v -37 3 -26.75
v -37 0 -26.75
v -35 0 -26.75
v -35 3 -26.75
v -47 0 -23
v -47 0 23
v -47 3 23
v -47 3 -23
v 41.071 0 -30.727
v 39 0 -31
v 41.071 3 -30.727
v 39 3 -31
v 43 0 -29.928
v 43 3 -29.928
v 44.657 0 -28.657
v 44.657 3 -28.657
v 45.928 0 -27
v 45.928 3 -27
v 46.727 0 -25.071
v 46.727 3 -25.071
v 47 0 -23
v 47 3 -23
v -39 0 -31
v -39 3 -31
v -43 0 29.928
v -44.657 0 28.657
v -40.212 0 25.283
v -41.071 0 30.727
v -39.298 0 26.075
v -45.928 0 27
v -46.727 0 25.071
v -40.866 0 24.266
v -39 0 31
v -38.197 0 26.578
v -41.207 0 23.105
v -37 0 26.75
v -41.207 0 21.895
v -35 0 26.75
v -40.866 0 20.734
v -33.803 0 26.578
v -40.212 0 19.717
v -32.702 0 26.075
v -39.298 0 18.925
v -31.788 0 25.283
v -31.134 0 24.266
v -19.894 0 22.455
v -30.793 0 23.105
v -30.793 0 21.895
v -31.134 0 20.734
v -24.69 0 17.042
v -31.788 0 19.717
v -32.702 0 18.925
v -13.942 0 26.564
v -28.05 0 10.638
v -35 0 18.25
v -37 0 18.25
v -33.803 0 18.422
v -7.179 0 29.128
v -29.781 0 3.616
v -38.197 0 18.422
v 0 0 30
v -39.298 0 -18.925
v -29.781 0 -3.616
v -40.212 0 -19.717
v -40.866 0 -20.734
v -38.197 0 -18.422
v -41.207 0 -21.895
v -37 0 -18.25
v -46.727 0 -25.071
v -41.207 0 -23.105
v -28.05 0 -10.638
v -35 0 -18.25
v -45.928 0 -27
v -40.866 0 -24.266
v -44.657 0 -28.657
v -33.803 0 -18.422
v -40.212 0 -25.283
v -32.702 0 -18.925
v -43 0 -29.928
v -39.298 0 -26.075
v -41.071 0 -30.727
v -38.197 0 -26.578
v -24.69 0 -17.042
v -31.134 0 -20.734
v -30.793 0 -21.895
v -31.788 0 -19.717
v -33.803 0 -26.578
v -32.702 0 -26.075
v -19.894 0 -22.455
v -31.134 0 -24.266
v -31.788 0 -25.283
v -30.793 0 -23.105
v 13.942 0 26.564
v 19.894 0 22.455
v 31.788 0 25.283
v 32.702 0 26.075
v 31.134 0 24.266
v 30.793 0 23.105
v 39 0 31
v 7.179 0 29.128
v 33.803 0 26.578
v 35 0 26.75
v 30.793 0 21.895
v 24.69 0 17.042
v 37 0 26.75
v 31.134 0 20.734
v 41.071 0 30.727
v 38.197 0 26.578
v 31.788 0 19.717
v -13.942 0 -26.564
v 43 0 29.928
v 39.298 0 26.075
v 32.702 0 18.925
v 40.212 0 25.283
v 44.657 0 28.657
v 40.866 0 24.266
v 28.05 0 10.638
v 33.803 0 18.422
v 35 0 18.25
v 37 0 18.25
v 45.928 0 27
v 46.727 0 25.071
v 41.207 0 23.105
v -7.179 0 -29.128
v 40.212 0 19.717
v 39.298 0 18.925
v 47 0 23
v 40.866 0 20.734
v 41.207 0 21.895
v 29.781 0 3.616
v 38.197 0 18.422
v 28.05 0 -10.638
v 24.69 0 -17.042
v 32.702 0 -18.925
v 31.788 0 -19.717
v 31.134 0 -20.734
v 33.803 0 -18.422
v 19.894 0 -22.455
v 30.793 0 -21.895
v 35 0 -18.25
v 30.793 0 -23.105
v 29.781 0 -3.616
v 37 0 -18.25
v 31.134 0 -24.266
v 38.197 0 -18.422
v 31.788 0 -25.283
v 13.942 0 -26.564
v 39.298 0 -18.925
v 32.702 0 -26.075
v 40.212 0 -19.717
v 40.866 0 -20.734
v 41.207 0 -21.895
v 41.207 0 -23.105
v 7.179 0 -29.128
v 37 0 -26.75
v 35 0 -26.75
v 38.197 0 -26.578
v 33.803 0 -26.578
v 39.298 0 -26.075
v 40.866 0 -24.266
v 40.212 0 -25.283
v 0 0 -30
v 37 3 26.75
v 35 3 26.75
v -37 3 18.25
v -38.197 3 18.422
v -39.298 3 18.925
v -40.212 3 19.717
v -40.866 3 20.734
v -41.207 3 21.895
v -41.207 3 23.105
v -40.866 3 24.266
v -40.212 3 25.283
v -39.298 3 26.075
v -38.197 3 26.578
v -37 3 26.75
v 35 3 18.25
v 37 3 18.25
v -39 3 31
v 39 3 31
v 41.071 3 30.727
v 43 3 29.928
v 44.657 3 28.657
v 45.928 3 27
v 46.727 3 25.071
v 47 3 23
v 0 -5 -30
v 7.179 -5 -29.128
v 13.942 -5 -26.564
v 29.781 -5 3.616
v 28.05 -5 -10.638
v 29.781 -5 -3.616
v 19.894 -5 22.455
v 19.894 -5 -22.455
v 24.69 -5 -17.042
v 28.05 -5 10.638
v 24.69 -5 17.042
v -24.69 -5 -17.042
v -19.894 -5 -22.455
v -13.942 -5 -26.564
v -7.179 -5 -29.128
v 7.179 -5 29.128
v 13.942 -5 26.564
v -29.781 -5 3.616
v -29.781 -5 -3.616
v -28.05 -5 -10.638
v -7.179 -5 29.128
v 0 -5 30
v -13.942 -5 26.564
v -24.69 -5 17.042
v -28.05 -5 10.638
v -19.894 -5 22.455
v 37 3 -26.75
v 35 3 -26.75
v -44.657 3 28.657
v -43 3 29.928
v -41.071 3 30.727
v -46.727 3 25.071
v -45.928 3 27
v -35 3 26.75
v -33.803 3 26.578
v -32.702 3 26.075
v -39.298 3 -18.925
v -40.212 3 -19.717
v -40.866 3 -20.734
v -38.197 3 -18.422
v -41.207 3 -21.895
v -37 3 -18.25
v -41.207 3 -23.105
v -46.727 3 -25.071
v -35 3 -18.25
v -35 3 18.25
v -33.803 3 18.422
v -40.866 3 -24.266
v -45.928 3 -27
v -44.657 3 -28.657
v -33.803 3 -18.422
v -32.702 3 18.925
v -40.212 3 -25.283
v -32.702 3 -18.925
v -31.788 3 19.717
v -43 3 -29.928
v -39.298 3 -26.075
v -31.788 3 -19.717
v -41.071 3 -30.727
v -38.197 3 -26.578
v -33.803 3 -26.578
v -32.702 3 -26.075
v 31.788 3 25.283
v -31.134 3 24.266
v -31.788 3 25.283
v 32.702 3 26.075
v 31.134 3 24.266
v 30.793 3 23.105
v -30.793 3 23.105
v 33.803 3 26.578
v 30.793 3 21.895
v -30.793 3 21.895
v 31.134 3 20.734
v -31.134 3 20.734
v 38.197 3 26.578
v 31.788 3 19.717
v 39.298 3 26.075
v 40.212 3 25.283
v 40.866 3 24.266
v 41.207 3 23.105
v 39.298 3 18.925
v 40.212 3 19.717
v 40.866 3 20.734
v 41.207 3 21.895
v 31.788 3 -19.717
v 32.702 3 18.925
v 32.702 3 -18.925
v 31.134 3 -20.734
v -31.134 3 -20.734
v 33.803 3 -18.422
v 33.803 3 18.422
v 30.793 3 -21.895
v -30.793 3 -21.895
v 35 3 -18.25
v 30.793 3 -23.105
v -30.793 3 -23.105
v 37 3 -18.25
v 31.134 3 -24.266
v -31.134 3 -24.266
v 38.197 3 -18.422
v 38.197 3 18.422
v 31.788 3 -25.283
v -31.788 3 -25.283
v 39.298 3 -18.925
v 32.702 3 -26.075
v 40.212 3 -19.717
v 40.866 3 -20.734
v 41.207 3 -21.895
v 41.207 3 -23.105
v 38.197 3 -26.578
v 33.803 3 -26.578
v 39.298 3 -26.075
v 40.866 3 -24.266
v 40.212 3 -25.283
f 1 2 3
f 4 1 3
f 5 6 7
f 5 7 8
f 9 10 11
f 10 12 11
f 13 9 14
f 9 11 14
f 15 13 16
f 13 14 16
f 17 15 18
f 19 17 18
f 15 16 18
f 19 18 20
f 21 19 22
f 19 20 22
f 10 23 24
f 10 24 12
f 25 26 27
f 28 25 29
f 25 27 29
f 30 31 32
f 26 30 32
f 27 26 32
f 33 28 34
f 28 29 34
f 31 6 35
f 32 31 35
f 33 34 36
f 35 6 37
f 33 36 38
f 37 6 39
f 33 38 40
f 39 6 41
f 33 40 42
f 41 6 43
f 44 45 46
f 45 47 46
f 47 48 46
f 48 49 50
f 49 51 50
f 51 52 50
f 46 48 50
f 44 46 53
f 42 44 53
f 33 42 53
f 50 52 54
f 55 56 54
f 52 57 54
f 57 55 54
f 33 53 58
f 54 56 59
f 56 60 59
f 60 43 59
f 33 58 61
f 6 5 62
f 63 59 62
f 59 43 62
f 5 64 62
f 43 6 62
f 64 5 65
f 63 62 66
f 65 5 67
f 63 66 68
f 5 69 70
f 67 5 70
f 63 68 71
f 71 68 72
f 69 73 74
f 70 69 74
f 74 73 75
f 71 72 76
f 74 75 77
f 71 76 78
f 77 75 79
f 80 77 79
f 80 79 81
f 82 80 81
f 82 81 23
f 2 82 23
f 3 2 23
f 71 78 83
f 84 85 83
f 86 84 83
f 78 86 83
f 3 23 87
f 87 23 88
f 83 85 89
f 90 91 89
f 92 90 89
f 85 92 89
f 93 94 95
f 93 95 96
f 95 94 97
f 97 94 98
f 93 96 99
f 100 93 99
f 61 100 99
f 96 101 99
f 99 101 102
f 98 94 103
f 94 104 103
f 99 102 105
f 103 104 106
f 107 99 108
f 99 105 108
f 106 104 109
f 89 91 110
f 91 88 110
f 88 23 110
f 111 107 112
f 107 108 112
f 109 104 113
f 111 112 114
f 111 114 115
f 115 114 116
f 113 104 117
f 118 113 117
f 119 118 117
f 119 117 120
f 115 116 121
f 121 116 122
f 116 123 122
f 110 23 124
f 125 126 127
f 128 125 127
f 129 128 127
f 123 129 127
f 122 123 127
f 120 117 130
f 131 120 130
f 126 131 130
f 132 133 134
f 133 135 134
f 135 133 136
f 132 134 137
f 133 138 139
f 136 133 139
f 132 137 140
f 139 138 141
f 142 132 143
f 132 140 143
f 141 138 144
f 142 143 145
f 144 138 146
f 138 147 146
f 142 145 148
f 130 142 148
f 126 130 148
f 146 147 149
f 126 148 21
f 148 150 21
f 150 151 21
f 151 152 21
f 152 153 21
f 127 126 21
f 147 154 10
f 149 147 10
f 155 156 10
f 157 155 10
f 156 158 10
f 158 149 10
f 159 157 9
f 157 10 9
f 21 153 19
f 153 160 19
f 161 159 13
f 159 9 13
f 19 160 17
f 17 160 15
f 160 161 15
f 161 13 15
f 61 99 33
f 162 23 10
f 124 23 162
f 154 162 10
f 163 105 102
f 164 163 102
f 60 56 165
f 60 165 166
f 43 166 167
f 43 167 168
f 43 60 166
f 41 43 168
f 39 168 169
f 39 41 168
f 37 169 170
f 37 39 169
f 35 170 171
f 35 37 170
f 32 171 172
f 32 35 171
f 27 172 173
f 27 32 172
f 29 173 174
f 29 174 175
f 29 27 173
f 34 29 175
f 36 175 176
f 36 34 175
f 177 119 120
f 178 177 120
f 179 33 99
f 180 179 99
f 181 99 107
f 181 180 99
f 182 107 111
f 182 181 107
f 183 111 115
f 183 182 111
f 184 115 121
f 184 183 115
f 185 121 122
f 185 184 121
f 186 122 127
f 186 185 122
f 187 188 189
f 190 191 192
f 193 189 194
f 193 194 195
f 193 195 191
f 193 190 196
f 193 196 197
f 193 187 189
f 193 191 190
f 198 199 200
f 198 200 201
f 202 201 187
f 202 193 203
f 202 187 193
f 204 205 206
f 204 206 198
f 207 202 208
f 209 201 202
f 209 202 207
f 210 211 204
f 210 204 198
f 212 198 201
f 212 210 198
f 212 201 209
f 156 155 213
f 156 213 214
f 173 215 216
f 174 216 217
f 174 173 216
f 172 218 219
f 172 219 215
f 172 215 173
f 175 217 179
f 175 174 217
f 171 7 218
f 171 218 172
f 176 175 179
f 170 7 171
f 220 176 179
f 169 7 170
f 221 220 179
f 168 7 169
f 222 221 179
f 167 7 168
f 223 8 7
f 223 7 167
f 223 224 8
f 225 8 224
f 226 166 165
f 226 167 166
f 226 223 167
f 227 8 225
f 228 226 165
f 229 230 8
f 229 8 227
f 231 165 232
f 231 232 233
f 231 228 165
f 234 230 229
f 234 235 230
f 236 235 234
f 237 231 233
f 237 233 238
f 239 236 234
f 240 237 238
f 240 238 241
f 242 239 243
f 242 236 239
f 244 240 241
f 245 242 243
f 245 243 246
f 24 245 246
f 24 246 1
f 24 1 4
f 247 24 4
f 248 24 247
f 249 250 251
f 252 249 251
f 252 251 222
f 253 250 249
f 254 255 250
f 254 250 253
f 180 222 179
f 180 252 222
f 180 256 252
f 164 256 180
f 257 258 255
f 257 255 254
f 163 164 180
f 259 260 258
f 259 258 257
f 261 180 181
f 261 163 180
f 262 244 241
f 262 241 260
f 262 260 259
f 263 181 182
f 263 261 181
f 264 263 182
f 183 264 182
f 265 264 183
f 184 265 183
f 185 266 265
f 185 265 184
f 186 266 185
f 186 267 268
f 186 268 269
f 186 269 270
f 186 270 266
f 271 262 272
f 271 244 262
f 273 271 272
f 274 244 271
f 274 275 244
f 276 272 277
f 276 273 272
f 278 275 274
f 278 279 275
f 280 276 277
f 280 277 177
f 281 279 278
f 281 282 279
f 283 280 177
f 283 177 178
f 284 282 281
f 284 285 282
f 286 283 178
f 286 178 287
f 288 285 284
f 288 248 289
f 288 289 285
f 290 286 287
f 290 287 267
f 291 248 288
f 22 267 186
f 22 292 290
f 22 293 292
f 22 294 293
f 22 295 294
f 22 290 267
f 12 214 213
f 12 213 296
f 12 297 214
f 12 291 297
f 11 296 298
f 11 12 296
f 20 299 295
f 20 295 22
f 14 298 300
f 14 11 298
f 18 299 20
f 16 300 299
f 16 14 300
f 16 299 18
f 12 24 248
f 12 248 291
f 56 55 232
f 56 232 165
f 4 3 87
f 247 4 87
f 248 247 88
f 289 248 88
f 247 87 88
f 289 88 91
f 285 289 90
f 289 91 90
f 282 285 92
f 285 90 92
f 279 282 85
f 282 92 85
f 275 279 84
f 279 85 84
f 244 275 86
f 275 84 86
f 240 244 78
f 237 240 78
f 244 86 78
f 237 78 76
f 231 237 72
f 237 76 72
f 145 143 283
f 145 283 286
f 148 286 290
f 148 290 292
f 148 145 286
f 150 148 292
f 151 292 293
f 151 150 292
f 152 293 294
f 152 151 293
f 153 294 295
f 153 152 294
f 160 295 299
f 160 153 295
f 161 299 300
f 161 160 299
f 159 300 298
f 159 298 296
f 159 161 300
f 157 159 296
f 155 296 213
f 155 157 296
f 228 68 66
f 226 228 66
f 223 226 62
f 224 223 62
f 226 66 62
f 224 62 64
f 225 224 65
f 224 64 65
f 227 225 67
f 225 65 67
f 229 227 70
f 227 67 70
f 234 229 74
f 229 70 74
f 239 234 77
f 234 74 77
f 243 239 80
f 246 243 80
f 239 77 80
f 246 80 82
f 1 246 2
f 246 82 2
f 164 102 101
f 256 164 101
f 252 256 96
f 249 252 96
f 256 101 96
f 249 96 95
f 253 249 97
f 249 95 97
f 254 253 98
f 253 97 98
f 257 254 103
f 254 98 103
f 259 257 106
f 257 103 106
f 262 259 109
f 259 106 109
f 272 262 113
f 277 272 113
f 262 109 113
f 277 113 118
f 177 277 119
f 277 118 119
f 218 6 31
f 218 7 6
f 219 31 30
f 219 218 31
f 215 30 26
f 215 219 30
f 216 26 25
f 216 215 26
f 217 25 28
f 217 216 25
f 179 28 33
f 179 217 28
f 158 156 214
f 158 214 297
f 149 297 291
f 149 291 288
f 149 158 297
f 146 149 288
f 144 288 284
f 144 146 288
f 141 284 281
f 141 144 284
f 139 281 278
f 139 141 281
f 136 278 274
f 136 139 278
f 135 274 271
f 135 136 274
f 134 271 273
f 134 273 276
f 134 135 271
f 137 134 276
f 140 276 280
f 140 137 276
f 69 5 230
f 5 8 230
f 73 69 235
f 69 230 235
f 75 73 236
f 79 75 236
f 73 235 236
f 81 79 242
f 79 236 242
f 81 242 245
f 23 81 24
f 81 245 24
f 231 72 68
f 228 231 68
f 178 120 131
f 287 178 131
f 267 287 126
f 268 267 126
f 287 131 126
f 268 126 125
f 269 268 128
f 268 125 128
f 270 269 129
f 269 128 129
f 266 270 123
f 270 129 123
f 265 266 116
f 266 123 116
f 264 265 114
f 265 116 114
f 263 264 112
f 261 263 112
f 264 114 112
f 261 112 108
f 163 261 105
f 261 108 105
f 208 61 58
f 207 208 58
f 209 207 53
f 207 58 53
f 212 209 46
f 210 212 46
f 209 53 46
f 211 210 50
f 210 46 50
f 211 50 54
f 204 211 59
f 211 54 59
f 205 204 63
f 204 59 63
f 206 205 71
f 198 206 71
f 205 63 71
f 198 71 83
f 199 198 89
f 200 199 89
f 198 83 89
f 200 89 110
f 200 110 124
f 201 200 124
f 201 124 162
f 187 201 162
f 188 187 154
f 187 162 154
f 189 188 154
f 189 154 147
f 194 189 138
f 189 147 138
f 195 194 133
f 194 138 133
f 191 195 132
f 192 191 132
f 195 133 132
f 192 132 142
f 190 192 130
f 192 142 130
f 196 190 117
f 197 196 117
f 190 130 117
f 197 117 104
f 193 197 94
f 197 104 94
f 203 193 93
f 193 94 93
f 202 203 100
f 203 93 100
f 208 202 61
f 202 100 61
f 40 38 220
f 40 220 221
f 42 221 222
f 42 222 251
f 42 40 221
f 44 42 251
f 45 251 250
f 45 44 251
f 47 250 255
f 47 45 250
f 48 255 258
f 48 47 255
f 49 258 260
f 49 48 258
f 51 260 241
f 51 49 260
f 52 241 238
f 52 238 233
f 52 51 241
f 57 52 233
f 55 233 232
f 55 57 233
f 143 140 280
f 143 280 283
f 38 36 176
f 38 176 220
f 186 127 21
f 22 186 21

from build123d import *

# Parameters (mm, degrees)
SKETCH_1_W      = 94
SKETCH_1_H      = 62
EXTRUDE_1_DEPTH = 3
FILLET_1_R      = 8
SKETCH_7_R      = 30
EXTRUDE_2_DEPTH = 5


with BuildPart() as part:
    # 草图1 → 凸台-拉伸1 (new body)
    with BuildSketch(Plane(origin=(0, 0, 0), x_dir=(1, 0, 0), z_dir=(0, 1, 0))):
        Rectangle(SKETCH_1_W, SKETCH_1_H)
        with BuildLine():
            Line((-37, 26.75), (-35, 26.75))
            ThreePointArc((-35, 26.75), (-30.75, 22.5), (-35, 18.25))
            Line((-35, 18.25), (-37, 18.25))
            ThreePointArc((-37, 18.25), (-41.25, 22.5), (-37, 26.75))
        make_face(mode=Mode.SUBTRACT)
        with BuildLine():
            Line((37, 26.75), (35, 26.75))
            ThreePointArc((35, 26.75), (30.75, 22.5), (35, 18.25))
            Line((35, 18.25), (37, 18.25))
            ThreePointArc((37, 18.25), (41.25, 22.5), (37, 26.75))
        make_face(mode=Mode.SUBTRACT)
        with BuildLine():
            Line((37, -26.75), (35, -26.75))
            ThreePointArc((35, -26.75), (30.75, -22.5), (35, -18.25))
            Line((35, -18.25), (37, -18.25))
            ThreePointArc((37, -18.25), (41.25, -22.5), (37, -26.75))
        make_face(mode=Mode.SUBTRACT)
        with BuildLine():
            Line((-37, -26.75), (-35, -26.75))
            ThreePointArc((-35, -26.75), (-30.75, -22.5), (-35, -18.25))
            Line((-35, -18.25), (-37, -18.25))
            ThreePointArc((-37, -18.25), (-41.25, -22.5), (-37, -26.75))
        make_face(mode=Mode.SUBTRACT)
    extrude(amount=EXTRUDE_1_DEPTH)

    # 圆角1
    fillet_1_edges = [part.edges().sort_by_distance(p)[0] for p in [
        (-47, 1.5, -31),
        (47, 1.5, -31),
        (47, 1.5, 31),
        (-47, 1.5, 31),
    ]]
    fillet(fillet_1_edges, radius=FILLET_1_R)

    # 草图7 → 凸台-拉伸2 (add)
    with BuildSketch(Plane.XZ):
        with Locations(Location((0, 0, 0), (0, 0, 90))):
            Circle(SKETCH_7_R)
    extrude(amount=EXTRUDE_2_DEPTH)


solid = part.part
